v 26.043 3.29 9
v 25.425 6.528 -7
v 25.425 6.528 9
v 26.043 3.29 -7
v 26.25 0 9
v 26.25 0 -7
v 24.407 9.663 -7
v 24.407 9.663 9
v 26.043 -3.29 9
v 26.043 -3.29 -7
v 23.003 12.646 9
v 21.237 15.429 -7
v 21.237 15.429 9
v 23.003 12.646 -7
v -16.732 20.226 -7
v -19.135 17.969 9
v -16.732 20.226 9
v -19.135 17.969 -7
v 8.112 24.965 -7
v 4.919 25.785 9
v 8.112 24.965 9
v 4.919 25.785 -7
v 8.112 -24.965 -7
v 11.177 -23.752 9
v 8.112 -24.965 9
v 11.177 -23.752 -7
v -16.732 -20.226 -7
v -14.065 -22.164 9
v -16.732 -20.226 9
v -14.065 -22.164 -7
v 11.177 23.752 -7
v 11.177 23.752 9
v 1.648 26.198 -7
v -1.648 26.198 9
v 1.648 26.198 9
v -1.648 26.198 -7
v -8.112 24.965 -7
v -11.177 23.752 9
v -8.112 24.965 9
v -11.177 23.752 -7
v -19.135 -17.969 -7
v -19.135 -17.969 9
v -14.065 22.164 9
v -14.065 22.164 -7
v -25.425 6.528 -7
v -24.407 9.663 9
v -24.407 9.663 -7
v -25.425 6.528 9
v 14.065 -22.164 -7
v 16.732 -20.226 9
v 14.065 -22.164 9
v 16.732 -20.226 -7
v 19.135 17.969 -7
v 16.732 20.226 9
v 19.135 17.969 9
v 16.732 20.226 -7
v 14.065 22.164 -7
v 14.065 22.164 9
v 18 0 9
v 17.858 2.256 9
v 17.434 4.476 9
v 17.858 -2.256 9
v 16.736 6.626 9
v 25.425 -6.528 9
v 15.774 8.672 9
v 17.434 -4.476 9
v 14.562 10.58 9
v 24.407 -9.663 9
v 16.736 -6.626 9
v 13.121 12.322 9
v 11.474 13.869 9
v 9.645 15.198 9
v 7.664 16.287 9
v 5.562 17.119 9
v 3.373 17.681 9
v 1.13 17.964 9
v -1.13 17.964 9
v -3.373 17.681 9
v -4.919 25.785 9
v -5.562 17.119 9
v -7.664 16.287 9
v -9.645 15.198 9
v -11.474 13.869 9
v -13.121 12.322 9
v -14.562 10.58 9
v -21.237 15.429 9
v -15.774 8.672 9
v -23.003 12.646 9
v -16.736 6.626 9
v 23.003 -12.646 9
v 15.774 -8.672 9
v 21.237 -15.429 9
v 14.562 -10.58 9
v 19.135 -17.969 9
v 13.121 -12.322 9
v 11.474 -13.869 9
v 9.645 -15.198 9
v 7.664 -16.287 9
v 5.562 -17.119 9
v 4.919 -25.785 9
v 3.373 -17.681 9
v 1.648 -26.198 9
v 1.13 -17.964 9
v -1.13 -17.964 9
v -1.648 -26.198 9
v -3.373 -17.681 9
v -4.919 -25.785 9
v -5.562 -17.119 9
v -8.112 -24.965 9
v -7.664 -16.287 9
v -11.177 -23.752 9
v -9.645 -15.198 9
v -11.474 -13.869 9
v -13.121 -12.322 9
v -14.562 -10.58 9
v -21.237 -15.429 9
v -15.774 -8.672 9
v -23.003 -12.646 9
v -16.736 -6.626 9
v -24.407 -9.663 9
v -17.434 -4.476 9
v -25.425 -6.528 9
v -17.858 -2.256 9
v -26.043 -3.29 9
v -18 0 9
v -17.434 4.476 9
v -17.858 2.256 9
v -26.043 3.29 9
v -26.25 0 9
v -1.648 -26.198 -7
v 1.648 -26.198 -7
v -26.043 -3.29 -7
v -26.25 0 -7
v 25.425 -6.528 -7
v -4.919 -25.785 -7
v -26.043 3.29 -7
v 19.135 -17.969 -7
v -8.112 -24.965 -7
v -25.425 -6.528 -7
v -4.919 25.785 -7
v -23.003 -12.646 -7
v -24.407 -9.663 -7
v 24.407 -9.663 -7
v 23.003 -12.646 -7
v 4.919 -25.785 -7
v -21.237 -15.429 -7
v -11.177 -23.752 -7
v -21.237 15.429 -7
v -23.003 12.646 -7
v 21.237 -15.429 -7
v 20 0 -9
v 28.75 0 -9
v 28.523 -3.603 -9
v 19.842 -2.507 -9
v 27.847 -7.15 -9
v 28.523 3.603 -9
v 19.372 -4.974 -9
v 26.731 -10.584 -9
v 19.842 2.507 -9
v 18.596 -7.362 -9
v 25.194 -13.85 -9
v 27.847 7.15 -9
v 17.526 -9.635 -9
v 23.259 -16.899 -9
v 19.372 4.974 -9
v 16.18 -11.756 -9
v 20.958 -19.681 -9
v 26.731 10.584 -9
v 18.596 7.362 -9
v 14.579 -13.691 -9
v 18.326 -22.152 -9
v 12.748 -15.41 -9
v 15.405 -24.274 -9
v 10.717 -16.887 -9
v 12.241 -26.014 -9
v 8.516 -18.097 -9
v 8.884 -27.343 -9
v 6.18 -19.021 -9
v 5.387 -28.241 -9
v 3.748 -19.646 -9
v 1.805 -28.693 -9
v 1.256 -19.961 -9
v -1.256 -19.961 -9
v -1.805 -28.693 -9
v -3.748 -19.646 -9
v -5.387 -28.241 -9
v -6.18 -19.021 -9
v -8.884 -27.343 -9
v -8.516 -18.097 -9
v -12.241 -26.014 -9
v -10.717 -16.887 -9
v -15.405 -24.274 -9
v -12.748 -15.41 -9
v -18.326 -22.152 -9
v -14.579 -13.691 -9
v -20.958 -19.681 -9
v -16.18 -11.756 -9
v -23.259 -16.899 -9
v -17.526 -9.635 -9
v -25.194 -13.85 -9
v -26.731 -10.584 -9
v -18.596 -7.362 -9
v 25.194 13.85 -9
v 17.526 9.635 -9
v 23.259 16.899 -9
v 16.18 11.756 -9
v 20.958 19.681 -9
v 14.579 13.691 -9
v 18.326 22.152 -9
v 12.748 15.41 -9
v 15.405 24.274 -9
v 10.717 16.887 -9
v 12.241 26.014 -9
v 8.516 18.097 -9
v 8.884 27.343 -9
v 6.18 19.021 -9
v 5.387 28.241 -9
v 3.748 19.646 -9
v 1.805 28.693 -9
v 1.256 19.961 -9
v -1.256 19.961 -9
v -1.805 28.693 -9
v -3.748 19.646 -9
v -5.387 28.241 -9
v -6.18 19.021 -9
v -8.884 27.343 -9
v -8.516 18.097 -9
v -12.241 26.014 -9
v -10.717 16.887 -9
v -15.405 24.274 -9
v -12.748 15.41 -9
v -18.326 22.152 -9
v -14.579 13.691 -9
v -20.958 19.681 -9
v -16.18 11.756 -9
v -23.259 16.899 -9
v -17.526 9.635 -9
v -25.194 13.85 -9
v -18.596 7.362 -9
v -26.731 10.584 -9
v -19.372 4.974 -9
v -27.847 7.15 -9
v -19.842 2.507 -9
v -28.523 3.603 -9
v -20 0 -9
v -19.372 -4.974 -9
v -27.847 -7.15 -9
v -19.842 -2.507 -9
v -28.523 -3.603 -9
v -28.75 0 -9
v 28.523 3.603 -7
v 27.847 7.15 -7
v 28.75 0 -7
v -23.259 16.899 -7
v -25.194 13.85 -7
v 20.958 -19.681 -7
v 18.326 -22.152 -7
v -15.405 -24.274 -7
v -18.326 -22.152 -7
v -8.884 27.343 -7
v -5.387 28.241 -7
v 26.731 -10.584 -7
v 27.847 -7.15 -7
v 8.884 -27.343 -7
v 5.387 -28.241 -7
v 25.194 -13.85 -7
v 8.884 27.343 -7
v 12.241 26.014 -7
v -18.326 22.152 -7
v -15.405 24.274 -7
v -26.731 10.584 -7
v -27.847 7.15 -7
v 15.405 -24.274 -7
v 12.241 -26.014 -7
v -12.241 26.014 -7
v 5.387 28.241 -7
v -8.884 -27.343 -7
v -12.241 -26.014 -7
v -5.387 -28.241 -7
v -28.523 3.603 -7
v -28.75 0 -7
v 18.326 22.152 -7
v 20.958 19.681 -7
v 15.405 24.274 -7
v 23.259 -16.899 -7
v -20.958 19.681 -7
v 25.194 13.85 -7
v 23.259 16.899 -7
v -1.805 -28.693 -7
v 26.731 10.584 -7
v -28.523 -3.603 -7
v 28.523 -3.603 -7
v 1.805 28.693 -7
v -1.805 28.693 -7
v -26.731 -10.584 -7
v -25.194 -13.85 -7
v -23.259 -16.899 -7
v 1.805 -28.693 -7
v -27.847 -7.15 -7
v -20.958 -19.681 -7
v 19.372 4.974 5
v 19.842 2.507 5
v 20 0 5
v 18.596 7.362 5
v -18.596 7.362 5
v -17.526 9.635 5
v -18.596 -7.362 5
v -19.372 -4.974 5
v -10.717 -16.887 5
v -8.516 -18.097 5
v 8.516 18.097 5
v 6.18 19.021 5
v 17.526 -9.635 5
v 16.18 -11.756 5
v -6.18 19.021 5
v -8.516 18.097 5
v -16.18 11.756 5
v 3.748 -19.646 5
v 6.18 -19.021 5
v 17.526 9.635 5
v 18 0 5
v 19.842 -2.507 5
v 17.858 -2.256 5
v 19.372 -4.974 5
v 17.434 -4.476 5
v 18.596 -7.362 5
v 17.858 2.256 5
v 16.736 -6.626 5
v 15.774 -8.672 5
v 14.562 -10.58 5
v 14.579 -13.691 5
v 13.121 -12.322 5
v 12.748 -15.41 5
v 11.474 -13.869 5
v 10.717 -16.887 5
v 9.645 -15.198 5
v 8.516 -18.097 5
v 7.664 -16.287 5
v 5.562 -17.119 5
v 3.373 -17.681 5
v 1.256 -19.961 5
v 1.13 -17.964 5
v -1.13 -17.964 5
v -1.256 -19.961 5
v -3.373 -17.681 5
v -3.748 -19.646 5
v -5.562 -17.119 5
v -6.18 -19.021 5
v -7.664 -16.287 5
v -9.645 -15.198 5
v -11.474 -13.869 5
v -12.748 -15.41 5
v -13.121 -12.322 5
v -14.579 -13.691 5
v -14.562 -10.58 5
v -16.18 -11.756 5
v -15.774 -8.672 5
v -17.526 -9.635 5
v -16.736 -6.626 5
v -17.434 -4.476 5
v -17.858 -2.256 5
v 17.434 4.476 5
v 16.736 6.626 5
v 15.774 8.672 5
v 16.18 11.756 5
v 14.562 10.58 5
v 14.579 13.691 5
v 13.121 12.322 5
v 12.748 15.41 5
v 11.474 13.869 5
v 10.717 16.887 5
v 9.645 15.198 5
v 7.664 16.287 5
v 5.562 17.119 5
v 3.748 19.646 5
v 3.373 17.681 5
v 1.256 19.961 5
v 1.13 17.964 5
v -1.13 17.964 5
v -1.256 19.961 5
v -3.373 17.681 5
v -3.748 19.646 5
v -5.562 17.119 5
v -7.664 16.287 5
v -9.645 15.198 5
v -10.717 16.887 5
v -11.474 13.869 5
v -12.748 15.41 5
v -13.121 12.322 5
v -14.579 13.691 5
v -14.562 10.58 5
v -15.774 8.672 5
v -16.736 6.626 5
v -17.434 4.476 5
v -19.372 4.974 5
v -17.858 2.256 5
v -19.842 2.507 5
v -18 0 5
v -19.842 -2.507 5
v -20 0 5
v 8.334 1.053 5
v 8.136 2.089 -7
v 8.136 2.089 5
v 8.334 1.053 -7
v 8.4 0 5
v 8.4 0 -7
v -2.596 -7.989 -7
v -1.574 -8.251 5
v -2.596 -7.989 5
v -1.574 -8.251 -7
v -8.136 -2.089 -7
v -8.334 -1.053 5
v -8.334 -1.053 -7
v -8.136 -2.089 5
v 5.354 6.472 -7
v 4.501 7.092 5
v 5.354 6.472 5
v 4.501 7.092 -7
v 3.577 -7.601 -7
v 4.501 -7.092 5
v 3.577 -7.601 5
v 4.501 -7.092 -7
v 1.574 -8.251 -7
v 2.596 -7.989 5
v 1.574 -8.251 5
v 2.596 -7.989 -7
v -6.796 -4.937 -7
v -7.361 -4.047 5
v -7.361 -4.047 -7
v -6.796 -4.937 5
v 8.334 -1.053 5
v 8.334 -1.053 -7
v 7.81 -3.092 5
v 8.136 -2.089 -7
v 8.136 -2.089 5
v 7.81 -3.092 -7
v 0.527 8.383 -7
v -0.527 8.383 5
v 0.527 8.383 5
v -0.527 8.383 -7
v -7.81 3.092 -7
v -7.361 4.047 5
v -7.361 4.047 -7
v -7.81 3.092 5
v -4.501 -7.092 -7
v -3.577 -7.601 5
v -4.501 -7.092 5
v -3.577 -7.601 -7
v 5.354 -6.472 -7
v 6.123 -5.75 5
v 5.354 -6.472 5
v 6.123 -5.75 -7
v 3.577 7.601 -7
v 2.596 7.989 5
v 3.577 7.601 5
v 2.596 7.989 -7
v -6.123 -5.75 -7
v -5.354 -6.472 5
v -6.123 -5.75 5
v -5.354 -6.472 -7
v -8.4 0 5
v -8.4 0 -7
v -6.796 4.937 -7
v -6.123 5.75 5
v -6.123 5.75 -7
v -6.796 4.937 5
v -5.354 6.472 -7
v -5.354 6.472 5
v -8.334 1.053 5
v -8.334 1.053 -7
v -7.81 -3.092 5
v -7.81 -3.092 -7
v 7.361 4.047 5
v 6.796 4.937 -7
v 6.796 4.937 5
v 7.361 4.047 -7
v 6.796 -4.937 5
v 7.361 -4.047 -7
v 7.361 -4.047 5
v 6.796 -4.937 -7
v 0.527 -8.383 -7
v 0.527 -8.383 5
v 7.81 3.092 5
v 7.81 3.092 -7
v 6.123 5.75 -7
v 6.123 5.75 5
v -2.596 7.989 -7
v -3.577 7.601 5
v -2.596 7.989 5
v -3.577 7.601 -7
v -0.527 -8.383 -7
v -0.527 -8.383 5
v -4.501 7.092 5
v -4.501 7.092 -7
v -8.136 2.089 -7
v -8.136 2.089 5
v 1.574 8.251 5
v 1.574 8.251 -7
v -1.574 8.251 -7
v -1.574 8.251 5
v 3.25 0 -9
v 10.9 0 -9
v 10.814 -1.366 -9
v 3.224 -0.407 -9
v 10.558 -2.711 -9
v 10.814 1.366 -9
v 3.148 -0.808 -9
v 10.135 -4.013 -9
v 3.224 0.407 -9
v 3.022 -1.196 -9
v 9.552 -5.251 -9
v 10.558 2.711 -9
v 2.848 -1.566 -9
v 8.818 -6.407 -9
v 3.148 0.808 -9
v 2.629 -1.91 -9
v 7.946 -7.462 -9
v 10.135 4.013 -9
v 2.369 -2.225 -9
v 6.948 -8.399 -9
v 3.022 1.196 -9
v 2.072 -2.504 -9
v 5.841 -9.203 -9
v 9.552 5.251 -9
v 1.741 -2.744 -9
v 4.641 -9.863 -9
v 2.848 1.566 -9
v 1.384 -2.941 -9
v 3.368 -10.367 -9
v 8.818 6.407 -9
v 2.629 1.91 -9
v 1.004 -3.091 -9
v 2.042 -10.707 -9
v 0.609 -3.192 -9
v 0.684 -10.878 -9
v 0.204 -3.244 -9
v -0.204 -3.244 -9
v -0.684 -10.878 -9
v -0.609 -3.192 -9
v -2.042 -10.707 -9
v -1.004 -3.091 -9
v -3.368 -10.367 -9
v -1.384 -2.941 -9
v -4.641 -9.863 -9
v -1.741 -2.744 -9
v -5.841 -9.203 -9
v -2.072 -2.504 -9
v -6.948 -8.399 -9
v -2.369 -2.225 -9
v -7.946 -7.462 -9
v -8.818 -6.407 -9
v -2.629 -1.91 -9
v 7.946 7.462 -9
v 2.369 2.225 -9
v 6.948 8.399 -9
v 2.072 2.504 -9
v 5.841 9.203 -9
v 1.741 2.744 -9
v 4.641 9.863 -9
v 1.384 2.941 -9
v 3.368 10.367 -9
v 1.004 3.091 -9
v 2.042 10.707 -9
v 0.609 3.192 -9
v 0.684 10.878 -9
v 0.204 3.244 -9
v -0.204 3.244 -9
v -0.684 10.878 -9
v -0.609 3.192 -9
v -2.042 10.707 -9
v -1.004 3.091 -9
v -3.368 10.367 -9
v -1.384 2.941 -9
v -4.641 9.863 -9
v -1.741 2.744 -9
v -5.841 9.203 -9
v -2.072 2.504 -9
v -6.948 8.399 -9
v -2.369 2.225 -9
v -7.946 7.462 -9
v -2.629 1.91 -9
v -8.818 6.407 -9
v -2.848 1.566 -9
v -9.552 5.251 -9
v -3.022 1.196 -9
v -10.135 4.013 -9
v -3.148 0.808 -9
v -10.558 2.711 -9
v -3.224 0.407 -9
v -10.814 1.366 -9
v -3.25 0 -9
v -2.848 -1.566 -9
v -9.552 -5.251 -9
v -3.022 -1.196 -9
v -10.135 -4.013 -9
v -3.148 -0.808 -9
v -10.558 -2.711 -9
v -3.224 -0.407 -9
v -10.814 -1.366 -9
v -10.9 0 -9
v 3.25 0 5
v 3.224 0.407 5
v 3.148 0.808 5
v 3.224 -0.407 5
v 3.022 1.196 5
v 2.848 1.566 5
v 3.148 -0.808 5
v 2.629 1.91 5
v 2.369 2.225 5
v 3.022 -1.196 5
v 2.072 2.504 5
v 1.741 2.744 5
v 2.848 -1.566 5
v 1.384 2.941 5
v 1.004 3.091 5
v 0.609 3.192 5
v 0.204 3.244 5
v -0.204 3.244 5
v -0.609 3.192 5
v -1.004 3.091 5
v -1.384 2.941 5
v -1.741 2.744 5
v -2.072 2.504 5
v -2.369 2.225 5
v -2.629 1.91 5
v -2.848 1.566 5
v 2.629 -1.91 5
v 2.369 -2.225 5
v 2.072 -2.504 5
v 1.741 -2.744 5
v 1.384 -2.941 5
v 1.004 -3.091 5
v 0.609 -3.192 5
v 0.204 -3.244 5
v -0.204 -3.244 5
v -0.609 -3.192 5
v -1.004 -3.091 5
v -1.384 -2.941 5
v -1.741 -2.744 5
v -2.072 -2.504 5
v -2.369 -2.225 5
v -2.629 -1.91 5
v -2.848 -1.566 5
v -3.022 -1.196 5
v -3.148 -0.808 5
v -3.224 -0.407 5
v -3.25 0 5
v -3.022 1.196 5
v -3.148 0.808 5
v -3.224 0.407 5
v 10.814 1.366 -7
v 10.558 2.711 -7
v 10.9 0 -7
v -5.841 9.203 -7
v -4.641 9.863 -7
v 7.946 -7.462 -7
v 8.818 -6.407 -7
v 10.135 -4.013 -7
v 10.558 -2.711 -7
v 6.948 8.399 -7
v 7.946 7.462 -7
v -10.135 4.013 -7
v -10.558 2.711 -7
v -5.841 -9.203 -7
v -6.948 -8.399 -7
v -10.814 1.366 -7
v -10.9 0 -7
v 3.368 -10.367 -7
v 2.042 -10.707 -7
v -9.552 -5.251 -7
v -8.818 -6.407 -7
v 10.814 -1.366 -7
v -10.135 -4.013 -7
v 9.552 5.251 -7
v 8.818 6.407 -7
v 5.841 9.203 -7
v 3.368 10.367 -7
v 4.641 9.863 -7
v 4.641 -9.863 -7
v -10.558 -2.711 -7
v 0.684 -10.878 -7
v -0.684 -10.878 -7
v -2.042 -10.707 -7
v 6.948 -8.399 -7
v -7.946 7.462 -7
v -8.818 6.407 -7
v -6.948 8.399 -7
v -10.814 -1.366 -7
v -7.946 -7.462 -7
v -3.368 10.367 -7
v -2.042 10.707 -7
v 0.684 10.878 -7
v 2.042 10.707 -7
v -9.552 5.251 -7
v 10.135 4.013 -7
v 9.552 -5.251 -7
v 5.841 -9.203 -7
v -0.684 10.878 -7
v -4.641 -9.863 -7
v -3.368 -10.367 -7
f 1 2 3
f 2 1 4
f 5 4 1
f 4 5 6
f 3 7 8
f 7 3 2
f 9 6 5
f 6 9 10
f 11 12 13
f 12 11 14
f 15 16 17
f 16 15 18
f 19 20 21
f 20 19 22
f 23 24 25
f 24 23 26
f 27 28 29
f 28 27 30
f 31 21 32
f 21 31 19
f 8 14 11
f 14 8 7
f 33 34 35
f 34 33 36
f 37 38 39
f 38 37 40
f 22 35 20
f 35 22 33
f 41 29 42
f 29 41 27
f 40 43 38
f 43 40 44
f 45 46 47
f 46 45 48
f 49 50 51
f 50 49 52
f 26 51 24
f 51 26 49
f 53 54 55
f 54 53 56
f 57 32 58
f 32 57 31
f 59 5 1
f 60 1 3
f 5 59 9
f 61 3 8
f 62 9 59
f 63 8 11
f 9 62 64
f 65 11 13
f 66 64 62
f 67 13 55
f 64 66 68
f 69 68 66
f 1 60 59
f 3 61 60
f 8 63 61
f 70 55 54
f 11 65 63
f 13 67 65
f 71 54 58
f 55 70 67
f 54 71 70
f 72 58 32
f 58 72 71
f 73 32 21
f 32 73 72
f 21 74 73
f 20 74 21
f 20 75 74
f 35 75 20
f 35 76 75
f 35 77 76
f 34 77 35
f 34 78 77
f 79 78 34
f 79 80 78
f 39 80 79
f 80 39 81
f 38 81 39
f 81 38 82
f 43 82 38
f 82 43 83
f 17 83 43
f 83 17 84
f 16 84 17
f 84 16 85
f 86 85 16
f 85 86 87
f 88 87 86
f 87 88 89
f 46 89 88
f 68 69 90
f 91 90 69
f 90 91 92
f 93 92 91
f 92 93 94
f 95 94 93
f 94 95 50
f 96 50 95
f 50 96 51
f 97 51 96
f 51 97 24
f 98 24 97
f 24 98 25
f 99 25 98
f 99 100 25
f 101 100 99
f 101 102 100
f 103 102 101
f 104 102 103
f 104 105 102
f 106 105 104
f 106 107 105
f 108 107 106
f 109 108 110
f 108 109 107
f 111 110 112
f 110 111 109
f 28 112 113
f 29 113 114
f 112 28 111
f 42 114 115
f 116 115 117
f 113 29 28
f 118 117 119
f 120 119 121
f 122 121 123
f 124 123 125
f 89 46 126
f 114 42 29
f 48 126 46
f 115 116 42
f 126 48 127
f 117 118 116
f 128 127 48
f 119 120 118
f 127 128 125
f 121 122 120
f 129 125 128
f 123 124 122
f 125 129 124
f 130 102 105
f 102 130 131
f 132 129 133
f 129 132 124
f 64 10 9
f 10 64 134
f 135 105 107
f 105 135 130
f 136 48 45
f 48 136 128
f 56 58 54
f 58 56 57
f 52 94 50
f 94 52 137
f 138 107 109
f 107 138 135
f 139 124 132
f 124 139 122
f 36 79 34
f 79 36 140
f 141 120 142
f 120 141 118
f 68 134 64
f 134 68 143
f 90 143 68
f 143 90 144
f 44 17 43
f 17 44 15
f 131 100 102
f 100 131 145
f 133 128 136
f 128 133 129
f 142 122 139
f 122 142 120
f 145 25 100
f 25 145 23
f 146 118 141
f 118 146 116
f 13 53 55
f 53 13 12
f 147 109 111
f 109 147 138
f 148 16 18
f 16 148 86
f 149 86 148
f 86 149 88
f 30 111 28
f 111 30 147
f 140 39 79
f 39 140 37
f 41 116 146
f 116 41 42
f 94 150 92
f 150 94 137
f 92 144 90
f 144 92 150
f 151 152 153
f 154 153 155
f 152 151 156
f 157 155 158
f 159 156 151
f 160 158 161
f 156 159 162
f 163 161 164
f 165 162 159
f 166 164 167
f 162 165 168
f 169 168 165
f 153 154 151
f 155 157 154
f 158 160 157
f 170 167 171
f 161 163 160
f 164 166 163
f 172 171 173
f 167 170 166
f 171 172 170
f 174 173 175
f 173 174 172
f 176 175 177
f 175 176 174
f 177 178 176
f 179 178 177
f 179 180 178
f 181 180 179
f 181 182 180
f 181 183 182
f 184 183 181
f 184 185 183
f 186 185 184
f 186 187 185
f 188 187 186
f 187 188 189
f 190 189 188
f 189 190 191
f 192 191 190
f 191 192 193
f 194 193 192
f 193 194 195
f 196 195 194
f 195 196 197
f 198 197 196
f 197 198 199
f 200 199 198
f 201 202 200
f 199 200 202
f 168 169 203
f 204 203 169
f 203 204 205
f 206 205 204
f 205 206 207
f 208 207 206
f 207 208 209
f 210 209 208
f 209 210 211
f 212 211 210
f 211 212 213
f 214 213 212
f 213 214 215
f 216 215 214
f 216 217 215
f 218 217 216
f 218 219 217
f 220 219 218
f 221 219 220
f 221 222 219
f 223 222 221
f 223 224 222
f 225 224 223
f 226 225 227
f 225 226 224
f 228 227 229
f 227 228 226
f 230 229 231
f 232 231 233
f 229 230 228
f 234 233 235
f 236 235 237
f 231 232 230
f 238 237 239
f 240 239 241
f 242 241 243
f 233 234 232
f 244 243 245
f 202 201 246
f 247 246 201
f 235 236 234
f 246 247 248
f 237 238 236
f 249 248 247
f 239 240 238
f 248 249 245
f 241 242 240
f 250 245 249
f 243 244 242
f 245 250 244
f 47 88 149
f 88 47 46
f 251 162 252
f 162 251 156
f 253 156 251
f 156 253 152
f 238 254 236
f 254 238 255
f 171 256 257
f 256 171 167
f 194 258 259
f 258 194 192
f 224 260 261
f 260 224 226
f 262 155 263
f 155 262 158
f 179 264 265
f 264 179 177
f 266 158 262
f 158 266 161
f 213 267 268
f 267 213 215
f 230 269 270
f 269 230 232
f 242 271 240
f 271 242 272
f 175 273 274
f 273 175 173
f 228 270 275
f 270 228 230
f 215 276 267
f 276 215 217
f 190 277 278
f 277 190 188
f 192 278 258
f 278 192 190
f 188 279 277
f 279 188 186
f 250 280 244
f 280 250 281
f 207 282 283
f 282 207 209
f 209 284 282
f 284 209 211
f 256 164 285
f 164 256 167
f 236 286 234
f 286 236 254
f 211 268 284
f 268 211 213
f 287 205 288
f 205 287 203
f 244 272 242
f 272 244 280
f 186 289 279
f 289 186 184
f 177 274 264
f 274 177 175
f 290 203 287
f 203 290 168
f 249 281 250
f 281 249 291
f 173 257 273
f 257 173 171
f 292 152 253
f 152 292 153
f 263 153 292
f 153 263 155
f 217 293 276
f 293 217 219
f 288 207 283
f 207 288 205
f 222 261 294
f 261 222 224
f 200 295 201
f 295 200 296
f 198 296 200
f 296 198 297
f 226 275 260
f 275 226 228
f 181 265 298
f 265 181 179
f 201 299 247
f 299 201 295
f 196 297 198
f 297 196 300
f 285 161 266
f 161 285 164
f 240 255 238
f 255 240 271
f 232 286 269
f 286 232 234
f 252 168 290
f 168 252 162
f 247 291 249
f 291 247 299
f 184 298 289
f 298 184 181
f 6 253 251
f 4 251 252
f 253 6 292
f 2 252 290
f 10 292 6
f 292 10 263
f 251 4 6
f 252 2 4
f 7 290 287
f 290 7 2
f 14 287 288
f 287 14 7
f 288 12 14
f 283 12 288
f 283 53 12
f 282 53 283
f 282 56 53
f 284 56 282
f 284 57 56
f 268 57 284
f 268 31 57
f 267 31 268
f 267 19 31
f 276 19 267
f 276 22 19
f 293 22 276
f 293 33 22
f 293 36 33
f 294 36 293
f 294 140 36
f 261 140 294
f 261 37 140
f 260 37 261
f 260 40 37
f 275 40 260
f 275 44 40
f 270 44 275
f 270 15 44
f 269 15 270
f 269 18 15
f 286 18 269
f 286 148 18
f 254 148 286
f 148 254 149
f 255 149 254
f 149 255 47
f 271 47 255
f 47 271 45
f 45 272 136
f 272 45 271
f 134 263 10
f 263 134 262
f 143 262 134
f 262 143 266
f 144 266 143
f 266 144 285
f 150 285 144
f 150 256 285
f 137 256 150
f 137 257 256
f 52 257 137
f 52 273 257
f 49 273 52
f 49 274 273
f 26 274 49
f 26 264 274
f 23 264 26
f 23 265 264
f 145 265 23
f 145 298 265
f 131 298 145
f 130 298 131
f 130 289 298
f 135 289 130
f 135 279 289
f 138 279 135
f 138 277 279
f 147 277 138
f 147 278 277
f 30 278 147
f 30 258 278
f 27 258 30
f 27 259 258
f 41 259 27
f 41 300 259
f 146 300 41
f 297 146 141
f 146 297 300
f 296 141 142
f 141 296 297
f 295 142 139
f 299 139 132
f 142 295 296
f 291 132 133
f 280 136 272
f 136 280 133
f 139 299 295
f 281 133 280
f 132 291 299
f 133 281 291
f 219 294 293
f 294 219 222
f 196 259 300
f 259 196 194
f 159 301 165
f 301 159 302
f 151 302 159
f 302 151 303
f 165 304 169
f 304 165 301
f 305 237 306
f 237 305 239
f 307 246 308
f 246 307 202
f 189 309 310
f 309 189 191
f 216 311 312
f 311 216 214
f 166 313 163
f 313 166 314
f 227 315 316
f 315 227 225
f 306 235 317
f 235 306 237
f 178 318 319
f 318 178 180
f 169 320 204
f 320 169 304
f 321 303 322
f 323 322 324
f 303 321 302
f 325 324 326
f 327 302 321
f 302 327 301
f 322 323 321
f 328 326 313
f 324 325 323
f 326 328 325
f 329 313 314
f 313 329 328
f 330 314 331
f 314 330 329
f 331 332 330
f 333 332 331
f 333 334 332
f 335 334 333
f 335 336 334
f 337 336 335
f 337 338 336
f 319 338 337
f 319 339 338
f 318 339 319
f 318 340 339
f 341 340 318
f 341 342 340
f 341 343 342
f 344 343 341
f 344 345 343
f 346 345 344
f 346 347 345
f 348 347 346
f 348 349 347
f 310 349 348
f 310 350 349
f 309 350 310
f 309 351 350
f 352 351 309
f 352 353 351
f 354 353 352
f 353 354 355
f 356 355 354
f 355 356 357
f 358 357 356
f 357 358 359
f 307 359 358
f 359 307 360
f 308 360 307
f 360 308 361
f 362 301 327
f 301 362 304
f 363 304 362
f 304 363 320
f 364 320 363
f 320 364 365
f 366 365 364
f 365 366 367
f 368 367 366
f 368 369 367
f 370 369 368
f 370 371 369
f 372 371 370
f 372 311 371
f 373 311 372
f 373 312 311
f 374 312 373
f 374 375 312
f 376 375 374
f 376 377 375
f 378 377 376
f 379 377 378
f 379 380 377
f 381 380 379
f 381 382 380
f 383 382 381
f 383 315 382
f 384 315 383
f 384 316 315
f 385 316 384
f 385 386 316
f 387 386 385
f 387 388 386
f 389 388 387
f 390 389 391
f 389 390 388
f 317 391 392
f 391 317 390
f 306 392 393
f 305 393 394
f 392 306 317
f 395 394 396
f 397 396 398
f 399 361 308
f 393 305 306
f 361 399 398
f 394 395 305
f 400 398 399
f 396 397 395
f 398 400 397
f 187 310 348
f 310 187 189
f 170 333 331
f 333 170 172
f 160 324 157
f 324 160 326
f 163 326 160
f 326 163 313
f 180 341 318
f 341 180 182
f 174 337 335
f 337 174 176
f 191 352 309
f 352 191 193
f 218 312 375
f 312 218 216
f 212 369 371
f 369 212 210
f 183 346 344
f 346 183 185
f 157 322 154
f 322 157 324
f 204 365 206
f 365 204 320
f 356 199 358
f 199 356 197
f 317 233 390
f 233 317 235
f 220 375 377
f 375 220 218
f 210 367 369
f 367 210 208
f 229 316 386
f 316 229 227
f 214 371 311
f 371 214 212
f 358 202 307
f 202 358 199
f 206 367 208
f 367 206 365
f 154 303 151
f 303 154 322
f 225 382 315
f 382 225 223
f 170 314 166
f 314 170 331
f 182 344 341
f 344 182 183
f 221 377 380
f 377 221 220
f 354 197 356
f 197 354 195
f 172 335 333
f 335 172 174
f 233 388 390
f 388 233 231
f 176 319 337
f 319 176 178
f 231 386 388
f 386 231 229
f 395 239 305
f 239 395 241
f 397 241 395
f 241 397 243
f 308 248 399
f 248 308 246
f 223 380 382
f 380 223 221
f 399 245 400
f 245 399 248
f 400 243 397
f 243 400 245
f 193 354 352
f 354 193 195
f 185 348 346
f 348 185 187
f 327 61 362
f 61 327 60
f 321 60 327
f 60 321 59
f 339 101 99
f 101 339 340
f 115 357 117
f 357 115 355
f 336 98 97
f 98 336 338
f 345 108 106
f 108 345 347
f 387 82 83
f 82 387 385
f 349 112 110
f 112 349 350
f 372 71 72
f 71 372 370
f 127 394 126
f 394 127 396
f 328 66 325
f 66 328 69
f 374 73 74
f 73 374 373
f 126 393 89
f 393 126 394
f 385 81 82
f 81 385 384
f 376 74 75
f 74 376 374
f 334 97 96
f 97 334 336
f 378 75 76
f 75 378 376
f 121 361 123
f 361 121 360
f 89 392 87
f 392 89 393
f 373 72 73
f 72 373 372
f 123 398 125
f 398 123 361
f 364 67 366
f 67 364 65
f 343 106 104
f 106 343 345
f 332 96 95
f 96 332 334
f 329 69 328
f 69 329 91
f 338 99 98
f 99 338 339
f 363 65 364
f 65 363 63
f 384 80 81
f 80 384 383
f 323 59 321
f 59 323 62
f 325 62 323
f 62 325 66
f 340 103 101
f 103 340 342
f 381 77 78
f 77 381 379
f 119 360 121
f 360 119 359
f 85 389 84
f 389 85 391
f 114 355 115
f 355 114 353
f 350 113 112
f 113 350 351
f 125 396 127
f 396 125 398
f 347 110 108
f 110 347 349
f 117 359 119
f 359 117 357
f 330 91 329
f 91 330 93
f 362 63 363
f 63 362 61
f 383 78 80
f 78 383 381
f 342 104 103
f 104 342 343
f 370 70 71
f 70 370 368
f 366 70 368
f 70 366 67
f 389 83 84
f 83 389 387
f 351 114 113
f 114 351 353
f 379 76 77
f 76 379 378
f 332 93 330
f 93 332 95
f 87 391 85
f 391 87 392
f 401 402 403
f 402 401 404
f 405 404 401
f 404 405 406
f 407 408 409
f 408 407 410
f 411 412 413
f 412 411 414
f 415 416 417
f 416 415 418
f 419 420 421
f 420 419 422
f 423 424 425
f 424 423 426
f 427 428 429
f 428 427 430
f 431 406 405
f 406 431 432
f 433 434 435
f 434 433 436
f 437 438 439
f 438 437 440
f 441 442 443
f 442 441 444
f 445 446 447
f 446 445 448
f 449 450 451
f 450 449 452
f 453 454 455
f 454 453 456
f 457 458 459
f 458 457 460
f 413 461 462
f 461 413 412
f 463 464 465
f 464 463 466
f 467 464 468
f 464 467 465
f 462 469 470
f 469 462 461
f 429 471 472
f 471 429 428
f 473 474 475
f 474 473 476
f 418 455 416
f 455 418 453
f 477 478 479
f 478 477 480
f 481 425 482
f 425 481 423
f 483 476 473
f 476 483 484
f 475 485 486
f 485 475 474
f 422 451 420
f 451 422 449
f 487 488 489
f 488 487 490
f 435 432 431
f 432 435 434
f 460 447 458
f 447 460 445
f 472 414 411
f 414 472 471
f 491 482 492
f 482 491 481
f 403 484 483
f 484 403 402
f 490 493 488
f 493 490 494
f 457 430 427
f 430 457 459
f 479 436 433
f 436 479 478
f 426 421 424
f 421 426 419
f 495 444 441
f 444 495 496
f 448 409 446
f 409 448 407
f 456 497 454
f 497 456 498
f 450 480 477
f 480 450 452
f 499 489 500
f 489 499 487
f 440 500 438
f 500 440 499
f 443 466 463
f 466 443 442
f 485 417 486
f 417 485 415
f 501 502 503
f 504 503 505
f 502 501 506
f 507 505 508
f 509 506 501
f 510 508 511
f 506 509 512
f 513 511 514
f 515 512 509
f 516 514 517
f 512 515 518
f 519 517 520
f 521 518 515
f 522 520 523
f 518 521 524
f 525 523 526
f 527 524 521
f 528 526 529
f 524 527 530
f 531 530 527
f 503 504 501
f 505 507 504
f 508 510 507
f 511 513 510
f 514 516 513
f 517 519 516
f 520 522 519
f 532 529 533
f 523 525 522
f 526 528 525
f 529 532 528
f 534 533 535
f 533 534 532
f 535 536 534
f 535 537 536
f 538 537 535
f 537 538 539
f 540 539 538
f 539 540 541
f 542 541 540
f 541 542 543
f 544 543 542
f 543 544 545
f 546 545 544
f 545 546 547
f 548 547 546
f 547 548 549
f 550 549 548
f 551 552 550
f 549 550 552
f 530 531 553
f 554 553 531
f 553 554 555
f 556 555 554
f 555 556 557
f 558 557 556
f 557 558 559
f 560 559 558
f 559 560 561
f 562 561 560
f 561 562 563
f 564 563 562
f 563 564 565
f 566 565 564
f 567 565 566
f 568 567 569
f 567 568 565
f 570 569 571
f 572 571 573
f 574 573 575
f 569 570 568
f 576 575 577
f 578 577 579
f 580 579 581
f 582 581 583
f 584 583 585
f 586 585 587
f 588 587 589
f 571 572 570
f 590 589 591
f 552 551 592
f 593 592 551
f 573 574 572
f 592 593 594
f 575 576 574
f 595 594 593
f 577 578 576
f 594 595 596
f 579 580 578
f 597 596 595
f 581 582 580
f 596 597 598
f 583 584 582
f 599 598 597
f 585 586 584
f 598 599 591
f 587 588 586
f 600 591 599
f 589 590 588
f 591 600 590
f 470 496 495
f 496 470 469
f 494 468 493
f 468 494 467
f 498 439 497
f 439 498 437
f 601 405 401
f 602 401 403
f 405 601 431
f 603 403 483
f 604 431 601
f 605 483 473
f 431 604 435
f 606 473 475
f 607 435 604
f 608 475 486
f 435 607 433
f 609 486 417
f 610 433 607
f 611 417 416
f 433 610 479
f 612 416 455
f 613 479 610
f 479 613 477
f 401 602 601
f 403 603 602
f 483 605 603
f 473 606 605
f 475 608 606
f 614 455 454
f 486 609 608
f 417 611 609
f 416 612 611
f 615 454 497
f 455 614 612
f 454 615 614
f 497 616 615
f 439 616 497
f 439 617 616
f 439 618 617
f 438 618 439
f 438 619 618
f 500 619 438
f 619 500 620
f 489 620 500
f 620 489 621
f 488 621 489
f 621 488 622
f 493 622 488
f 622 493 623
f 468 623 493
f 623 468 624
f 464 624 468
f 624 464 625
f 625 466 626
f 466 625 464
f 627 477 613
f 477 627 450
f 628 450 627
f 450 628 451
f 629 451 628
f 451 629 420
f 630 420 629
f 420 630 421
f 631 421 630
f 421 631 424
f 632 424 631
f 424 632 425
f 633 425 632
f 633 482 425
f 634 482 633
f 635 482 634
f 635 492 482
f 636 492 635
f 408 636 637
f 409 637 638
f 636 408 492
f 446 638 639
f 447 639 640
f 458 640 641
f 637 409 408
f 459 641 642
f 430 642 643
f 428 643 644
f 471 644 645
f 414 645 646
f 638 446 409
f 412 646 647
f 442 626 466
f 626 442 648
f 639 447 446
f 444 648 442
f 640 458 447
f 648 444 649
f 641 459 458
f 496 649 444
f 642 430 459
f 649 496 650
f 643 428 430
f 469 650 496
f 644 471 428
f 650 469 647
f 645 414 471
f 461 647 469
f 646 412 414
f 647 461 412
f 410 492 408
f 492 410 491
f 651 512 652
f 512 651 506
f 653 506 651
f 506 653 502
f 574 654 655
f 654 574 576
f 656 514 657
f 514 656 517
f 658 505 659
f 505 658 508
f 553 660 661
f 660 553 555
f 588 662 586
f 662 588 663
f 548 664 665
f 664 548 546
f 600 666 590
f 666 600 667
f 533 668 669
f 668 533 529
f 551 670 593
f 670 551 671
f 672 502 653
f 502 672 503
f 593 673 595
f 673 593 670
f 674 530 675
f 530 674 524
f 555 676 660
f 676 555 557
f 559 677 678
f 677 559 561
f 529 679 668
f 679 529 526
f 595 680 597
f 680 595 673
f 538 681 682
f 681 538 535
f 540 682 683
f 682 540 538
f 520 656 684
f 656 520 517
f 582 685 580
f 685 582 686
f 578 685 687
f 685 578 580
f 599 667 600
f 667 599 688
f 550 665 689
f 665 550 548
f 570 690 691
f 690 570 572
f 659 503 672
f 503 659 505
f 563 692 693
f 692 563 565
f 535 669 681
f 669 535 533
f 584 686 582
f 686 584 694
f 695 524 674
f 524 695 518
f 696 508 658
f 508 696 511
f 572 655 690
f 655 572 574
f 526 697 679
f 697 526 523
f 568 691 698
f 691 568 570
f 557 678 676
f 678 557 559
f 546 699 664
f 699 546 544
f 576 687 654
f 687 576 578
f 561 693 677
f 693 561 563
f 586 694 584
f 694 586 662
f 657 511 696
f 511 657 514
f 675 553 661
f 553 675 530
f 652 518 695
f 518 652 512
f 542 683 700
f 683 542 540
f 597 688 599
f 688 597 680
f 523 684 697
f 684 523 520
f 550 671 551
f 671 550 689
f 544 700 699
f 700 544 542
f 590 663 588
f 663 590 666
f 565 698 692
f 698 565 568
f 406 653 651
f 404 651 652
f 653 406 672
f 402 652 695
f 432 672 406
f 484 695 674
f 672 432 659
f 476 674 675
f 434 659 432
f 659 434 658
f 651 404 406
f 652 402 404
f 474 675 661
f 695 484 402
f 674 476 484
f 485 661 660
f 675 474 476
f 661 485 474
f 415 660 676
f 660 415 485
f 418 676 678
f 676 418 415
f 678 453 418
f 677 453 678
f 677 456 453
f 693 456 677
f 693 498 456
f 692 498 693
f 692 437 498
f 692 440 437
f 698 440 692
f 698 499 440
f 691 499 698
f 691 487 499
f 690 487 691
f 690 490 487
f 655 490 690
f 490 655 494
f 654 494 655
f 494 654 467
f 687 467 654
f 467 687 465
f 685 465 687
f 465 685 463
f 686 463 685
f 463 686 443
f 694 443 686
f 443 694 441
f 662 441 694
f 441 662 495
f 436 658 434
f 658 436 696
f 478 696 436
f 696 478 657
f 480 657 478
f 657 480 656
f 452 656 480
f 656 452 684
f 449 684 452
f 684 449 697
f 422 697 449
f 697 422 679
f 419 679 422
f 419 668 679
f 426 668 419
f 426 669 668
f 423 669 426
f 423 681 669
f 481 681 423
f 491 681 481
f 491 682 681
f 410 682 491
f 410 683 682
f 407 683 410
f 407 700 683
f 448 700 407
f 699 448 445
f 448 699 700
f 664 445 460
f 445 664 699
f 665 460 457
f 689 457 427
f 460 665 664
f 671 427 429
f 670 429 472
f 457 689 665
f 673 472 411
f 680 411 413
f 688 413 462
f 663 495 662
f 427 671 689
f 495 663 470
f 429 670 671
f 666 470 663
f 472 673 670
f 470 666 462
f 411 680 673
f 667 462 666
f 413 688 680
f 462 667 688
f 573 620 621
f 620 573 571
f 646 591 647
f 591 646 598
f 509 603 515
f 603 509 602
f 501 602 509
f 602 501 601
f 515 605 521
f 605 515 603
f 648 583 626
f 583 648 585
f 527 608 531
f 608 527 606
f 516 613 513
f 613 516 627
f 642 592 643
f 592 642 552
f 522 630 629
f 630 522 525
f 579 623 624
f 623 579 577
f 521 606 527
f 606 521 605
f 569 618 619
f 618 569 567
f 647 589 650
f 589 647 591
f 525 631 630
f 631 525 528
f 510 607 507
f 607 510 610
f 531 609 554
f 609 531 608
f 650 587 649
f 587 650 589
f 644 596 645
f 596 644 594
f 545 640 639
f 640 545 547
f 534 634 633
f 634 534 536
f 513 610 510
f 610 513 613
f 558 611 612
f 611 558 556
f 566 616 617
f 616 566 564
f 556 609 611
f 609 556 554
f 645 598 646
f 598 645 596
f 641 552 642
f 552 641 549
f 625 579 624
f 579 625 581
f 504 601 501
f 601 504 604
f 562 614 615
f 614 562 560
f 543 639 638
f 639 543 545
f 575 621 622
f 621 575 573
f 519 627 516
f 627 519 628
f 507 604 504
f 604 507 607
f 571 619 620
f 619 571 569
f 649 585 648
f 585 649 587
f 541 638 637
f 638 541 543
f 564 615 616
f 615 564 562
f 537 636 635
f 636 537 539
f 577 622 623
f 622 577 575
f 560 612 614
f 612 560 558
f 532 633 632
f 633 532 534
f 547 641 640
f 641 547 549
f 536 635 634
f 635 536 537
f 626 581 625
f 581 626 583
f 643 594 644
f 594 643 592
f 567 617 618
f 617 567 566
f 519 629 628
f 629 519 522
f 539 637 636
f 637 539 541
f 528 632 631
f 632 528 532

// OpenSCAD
/* Domecek pro lozisko spulky fillamentu
Blind Pew <blind.pew96@gmail.com>
GNU v3
*/

module rolna() {
	$fn = 50;
	spulka_prumer = 52.5; //diameter
	spulka_vyska = 18; //height
	//rozmery pro lozisko 6203
	loz_vnejsi = 40; //external diameter bearing
	loz_vyska = 14; //height bearing
	loz_vnitr = 16.8; //internal diameter bearing
	dira = 6.5; //hole
	hrana = 2;

	difference() {
		union() {
			cylinder(d = spulka_prumer, h = spulka_vyska, center = true);
			translate([0,0,-((spulka_vyska-hrana)/2)])			
				cylinder(d = spulka_prumer+5, h = hrana, center = true);
		}
		translate([0,0,-((spulka_vyska-loz_vyska)/2)])
			cylinder(d = loz_vnejsi, h = loz_vyska, center = true);
		cylinder(d = loz_vnejsi-hrana*2, h = spulka_vyska, center = true);
		cylinder(d = dira, h = spulka_vyska, center = true);
	}
	translate([0,0,-((spulka_vyska-loz_vyska)/2)])
		difference() {
			union() {
				cylinder(d = loz_vnitr, h = loz_vyska, center = true);
				translate([0,0,-((loz_vyska-hrana)/2)])
					cylinder(d = loz_vnitr+5, h = hrana, center = true);
			}
			cylinder(d = dira, h = loz_vyska, center = true);
		}
}
rolna();
